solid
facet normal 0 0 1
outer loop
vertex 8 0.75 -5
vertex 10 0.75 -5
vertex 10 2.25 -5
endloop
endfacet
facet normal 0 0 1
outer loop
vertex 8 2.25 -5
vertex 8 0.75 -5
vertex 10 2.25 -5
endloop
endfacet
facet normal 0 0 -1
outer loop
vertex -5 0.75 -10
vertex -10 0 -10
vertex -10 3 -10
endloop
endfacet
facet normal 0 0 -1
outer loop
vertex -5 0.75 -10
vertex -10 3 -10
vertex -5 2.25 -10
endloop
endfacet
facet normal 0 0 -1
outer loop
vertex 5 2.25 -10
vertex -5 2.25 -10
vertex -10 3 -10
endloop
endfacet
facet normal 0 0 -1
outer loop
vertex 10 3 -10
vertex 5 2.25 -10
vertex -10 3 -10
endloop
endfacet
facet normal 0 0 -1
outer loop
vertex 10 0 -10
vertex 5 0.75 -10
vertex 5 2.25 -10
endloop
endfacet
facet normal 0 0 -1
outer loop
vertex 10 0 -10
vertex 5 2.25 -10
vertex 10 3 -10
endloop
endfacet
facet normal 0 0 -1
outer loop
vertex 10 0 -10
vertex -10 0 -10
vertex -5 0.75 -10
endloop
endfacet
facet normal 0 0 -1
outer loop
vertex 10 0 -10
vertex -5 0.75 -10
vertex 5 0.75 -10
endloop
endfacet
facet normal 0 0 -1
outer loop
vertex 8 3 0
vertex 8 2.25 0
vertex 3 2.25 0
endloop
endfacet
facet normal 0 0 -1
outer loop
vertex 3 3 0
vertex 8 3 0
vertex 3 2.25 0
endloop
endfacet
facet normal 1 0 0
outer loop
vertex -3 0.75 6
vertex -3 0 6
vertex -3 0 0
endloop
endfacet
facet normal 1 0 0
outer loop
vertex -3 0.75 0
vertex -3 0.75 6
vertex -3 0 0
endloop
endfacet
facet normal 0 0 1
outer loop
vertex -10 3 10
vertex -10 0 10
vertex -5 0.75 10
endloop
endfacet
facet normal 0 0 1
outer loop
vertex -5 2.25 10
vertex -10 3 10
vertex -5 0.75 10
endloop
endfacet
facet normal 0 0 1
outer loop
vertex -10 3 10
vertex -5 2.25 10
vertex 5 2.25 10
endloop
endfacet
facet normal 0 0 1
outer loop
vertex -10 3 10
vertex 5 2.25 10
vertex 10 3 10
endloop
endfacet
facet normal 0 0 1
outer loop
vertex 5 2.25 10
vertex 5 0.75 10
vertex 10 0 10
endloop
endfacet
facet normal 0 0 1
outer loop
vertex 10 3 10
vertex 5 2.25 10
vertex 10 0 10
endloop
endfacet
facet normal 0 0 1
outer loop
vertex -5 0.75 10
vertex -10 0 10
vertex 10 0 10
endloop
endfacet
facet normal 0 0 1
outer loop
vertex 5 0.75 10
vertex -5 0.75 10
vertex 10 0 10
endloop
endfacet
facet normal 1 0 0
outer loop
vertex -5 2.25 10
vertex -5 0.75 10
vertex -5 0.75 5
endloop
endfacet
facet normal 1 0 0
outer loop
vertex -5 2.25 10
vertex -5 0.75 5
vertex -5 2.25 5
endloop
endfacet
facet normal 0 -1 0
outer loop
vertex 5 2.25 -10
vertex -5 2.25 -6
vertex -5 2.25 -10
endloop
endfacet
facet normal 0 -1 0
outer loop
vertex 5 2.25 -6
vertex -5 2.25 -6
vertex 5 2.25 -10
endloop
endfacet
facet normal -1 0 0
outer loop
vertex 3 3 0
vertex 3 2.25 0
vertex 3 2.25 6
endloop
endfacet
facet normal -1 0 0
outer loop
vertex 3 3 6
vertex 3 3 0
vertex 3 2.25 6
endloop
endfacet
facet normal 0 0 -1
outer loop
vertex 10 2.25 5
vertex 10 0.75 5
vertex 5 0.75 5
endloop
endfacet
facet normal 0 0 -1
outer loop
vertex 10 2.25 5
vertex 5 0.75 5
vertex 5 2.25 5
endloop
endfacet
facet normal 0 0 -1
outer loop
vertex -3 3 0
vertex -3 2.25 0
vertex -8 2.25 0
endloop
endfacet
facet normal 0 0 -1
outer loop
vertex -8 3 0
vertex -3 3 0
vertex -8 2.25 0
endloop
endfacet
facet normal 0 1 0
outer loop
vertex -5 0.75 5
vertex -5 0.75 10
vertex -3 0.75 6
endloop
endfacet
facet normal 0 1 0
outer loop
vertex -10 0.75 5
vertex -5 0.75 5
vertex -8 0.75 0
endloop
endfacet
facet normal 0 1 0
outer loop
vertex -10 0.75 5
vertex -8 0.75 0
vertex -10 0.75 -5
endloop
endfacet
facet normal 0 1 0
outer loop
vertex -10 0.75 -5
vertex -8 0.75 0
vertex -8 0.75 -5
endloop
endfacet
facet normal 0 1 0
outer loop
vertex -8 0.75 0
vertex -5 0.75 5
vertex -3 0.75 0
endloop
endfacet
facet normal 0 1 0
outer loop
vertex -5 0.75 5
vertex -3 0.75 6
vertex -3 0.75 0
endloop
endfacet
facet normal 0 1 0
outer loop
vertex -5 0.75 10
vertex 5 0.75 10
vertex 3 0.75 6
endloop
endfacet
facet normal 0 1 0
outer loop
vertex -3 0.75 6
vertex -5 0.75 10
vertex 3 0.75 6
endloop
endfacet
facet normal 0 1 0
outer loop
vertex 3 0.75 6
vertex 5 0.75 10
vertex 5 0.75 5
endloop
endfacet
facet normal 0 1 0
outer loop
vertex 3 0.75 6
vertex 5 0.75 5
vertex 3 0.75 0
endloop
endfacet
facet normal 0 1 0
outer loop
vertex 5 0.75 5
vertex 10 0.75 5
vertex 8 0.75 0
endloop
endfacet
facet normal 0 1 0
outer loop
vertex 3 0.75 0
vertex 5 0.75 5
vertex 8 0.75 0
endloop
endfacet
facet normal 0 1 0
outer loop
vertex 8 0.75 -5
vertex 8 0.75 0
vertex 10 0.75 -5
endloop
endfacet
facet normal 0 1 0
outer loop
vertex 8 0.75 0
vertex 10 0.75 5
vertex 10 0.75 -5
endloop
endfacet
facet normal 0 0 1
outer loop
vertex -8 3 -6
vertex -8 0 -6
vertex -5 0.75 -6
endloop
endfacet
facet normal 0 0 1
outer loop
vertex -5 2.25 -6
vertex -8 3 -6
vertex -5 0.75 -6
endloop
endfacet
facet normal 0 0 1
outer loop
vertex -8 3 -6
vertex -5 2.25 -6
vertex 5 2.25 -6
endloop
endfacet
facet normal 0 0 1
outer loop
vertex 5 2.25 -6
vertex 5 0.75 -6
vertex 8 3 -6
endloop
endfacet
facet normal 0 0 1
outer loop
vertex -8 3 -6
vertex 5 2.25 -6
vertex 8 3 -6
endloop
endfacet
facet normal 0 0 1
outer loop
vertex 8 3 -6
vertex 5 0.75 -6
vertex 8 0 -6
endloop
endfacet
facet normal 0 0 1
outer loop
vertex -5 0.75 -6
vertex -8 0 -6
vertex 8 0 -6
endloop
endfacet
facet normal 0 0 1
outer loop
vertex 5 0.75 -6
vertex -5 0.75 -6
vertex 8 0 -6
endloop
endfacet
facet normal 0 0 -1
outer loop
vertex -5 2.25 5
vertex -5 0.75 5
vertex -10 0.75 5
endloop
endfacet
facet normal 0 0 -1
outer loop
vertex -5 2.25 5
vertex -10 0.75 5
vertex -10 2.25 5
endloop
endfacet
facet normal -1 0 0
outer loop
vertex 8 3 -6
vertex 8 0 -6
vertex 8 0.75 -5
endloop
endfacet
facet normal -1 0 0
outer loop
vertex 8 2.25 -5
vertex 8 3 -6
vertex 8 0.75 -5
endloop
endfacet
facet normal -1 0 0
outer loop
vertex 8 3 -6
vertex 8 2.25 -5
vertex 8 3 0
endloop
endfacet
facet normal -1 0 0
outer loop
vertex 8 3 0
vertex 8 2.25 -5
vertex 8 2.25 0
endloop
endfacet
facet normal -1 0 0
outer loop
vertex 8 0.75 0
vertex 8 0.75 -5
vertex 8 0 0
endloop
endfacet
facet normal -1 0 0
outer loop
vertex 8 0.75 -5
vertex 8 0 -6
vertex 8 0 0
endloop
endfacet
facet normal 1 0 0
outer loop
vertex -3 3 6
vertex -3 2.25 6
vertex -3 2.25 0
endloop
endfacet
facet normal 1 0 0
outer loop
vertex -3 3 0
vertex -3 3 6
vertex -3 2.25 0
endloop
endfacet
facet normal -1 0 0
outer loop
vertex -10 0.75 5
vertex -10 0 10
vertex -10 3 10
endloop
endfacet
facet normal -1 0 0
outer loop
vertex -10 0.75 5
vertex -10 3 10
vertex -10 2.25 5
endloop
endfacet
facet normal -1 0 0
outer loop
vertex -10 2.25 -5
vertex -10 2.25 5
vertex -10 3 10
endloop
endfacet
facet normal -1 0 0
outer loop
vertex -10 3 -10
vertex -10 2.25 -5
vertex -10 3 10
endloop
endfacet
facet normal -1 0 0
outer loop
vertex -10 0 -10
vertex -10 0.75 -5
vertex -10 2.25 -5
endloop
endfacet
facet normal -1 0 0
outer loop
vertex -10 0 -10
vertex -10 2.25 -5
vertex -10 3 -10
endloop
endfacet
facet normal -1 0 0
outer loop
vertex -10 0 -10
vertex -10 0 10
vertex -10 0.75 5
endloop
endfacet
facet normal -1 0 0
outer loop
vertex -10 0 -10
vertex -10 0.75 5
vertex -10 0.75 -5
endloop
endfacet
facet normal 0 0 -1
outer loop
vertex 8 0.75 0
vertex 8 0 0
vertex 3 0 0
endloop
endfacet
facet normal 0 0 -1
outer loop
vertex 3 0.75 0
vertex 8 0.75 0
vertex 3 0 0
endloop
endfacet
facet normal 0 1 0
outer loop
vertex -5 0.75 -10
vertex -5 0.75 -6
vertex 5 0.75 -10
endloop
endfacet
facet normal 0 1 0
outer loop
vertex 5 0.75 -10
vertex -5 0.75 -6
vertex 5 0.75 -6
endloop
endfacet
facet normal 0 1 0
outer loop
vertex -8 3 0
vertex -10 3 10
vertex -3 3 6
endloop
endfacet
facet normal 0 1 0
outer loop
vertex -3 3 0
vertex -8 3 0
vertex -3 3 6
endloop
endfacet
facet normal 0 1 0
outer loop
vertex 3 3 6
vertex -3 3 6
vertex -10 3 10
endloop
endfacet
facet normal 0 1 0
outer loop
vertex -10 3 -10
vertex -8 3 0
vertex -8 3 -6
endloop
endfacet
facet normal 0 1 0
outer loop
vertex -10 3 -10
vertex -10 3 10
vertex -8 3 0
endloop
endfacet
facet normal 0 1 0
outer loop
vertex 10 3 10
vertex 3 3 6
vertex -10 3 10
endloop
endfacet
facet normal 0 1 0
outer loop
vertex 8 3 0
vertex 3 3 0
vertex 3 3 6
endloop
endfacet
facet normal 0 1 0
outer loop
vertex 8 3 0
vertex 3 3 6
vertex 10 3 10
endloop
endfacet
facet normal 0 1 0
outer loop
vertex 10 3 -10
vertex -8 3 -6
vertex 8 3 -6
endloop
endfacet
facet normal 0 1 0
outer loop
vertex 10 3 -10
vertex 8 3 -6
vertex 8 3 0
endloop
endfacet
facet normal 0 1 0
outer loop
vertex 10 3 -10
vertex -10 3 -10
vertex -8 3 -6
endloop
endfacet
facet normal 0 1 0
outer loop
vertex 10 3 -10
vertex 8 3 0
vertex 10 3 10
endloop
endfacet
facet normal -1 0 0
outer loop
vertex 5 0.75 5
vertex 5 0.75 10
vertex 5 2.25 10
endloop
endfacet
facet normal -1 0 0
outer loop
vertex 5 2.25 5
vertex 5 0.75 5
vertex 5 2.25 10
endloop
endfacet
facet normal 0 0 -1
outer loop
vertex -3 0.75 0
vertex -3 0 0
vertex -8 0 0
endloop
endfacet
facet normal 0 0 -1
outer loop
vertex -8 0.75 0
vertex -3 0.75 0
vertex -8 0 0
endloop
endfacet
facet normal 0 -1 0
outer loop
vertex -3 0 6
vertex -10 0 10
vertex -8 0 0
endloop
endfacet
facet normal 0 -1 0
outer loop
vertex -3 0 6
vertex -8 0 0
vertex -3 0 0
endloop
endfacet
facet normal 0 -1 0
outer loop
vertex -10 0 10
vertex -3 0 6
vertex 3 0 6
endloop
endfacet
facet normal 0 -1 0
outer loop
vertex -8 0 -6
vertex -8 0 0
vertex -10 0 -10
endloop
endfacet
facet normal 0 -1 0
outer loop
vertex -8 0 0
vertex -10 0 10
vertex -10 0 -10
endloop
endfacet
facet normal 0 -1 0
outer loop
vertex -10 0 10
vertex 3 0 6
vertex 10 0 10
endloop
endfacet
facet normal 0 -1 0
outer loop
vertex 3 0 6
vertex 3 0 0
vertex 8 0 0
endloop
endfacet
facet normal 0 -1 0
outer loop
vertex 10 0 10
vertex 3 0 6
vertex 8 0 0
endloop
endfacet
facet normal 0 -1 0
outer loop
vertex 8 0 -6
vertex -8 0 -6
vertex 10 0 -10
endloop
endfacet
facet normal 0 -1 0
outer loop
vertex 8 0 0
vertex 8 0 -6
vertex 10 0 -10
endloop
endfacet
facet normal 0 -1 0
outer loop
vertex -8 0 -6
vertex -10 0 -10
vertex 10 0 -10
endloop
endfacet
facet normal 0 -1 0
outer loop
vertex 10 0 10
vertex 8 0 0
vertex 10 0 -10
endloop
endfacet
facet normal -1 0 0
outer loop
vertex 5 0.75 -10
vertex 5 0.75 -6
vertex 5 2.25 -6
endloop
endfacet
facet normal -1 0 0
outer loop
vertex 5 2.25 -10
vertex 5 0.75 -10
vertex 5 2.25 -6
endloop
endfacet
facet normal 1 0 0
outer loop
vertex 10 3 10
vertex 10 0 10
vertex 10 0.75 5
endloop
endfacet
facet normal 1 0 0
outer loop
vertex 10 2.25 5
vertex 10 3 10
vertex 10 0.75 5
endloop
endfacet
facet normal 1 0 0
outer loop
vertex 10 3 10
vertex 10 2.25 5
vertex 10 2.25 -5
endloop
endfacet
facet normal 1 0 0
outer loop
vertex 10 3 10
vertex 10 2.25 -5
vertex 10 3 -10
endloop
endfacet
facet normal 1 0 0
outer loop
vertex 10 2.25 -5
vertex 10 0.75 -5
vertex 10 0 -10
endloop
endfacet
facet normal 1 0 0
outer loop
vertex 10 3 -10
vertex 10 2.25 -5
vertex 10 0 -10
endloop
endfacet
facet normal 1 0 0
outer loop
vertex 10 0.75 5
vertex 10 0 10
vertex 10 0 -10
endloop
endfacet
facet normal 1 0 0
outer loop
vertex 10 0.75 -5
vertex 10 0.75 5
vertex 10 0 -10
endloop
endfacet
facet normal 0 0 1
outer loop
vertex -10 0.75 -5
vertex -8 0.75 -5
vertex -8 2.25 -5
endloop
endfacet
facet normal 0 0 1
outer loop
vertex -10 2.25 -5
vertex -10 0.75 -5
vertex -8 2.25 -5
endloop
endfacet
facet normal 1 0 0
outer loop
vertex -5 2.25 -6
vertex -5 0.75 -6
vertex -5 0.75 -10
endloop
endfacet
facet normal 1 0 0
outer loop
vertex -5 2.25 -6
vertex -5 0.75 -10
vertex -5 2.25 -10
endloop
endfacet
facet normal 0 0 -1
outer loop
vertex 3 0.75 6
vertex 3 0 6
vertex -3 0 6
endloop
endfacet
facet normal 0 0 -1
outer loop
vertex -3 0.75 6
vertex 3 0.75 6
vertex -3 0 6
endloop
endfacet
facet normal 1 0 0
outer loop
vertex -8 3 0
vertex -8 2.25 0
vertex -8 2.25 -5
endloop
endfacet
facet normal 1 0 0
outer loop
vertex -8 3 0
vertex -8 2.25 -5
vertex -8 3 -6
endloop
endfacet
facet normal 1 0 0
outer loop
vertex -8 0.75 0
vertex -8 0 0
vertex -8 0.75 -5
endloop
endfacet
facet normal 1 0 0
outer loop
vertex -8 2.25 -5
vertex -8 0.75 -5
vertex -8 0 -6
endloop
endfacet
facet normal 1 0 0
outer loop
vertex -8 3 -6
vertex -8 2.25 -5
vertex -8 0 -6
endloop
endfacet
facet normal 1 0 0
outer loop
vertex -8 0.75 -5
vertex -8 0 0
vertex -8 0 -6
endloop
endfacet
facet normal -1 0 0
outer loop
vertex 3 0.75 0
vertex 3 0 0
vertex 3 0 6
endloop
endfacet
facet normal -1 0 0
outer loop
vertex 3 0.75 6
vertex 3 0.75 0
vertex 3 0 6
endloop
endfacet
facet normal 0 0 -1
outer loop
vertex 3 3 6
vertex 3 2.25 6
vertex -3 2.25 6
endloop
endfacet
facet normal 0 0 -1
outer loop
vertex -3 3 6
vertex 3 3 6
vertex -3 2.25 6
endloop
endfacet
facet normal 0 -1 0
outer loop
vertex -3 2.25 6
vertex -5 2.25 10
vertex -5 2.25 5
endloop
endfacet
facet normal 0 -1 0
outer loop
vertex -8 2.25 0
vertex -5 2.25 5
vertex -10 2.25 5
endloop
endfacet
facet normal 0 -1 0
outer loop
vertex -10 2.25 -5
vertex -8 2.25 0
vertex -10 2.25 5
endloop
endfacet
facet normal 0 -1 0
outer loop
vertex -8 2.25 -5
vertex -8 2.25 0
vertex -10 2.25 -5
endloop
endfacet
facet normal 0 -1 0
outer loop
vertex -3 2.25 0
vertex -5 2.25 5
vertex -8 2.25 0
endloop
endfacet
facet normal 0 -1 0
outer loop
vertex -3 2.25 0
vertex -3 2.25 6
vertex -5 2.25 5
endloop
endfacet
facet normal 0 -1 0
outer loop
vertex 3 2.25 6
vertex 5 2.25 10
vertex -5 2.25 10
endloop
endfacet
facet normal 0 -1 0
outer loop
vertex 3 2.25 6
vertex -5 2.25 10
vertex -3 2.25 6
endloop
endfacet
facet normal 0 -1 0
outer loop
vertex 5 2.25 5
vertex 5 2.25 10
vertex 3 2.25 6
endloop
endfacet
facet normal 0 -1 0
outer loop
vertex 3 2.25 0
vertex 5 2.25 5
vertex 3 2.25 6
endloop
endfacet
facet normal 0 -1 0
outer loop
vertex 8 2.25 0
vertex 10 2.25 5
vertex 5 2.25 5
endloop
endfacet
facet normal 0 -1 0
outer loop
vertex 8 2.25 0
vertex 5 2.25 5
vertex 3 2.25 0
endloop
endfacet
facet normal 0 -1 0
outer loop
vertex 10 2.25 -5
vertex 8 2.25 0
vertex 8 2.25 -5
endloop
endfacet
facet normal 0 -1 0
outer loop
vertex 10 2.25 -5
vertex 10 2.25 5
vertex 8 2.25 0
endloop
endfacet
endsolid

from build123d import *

# Parameters (mm, degrees)
SKETCH1_W           = 20
SKETCH1_H           = 20
BOSS_EXTRUDE1_DEPTH = 3
SKETCH2_W           = 10
SKETCH2_H           = 1.5
CUT_EXTRUDE1_DEPTH  = 21
SKETCH3_W           = 10
SKETCH3_H           = 1.5
CUT_EXTRUDE2_DEPTH  = 21


with BuildPart() as part:
    # Sketch1 → Boss-Extrude1 (new body)
    with BuildSketch(Plane(origin=(0, 0, 0), x_dir=(1, 0, 0), z_dir=(0, 1, 0))):
        Rectangle(SKETCH1_W, SKETCH1_H)
        Polygon((-3, 0), (-8, 0), (-8, 6), (8, 6), (8, 0), (3, 0), (3, -6), (-3, -6), align=None, mode=Mode.SUBTRACT)
    extrude(amount=BOSS_EXTRUDE1_DEPTH)

    # Sketch2 → Cut-Extrude1 (cut, through all)
    with BuildSketch(Plane.XY.offset(10)):
        with Locations((0, 1.5)):
            Rectangle(SKETCH2_W, SKETCH2_H)
    extrude(amount=-CUT_EXTRUDE1_DEPTH, mode=Mode.SUBTRACT)

    # Sketch3 → Cut-Extrude2 (cut, through all)
    with BuildSketch(Plane(origin=(10, 0, 0), x_dir=(0, 0, -1), z_dir=(1, 0, 0))):
        with Locations((0, 1.5)):
            Rectangle(SKETCH3_W, SKETCH3_H)
    extrude(amount=-CUT_EXTRUDE2_DEPTH, mode=Mode.SUBTRACT)


solid = part.part
